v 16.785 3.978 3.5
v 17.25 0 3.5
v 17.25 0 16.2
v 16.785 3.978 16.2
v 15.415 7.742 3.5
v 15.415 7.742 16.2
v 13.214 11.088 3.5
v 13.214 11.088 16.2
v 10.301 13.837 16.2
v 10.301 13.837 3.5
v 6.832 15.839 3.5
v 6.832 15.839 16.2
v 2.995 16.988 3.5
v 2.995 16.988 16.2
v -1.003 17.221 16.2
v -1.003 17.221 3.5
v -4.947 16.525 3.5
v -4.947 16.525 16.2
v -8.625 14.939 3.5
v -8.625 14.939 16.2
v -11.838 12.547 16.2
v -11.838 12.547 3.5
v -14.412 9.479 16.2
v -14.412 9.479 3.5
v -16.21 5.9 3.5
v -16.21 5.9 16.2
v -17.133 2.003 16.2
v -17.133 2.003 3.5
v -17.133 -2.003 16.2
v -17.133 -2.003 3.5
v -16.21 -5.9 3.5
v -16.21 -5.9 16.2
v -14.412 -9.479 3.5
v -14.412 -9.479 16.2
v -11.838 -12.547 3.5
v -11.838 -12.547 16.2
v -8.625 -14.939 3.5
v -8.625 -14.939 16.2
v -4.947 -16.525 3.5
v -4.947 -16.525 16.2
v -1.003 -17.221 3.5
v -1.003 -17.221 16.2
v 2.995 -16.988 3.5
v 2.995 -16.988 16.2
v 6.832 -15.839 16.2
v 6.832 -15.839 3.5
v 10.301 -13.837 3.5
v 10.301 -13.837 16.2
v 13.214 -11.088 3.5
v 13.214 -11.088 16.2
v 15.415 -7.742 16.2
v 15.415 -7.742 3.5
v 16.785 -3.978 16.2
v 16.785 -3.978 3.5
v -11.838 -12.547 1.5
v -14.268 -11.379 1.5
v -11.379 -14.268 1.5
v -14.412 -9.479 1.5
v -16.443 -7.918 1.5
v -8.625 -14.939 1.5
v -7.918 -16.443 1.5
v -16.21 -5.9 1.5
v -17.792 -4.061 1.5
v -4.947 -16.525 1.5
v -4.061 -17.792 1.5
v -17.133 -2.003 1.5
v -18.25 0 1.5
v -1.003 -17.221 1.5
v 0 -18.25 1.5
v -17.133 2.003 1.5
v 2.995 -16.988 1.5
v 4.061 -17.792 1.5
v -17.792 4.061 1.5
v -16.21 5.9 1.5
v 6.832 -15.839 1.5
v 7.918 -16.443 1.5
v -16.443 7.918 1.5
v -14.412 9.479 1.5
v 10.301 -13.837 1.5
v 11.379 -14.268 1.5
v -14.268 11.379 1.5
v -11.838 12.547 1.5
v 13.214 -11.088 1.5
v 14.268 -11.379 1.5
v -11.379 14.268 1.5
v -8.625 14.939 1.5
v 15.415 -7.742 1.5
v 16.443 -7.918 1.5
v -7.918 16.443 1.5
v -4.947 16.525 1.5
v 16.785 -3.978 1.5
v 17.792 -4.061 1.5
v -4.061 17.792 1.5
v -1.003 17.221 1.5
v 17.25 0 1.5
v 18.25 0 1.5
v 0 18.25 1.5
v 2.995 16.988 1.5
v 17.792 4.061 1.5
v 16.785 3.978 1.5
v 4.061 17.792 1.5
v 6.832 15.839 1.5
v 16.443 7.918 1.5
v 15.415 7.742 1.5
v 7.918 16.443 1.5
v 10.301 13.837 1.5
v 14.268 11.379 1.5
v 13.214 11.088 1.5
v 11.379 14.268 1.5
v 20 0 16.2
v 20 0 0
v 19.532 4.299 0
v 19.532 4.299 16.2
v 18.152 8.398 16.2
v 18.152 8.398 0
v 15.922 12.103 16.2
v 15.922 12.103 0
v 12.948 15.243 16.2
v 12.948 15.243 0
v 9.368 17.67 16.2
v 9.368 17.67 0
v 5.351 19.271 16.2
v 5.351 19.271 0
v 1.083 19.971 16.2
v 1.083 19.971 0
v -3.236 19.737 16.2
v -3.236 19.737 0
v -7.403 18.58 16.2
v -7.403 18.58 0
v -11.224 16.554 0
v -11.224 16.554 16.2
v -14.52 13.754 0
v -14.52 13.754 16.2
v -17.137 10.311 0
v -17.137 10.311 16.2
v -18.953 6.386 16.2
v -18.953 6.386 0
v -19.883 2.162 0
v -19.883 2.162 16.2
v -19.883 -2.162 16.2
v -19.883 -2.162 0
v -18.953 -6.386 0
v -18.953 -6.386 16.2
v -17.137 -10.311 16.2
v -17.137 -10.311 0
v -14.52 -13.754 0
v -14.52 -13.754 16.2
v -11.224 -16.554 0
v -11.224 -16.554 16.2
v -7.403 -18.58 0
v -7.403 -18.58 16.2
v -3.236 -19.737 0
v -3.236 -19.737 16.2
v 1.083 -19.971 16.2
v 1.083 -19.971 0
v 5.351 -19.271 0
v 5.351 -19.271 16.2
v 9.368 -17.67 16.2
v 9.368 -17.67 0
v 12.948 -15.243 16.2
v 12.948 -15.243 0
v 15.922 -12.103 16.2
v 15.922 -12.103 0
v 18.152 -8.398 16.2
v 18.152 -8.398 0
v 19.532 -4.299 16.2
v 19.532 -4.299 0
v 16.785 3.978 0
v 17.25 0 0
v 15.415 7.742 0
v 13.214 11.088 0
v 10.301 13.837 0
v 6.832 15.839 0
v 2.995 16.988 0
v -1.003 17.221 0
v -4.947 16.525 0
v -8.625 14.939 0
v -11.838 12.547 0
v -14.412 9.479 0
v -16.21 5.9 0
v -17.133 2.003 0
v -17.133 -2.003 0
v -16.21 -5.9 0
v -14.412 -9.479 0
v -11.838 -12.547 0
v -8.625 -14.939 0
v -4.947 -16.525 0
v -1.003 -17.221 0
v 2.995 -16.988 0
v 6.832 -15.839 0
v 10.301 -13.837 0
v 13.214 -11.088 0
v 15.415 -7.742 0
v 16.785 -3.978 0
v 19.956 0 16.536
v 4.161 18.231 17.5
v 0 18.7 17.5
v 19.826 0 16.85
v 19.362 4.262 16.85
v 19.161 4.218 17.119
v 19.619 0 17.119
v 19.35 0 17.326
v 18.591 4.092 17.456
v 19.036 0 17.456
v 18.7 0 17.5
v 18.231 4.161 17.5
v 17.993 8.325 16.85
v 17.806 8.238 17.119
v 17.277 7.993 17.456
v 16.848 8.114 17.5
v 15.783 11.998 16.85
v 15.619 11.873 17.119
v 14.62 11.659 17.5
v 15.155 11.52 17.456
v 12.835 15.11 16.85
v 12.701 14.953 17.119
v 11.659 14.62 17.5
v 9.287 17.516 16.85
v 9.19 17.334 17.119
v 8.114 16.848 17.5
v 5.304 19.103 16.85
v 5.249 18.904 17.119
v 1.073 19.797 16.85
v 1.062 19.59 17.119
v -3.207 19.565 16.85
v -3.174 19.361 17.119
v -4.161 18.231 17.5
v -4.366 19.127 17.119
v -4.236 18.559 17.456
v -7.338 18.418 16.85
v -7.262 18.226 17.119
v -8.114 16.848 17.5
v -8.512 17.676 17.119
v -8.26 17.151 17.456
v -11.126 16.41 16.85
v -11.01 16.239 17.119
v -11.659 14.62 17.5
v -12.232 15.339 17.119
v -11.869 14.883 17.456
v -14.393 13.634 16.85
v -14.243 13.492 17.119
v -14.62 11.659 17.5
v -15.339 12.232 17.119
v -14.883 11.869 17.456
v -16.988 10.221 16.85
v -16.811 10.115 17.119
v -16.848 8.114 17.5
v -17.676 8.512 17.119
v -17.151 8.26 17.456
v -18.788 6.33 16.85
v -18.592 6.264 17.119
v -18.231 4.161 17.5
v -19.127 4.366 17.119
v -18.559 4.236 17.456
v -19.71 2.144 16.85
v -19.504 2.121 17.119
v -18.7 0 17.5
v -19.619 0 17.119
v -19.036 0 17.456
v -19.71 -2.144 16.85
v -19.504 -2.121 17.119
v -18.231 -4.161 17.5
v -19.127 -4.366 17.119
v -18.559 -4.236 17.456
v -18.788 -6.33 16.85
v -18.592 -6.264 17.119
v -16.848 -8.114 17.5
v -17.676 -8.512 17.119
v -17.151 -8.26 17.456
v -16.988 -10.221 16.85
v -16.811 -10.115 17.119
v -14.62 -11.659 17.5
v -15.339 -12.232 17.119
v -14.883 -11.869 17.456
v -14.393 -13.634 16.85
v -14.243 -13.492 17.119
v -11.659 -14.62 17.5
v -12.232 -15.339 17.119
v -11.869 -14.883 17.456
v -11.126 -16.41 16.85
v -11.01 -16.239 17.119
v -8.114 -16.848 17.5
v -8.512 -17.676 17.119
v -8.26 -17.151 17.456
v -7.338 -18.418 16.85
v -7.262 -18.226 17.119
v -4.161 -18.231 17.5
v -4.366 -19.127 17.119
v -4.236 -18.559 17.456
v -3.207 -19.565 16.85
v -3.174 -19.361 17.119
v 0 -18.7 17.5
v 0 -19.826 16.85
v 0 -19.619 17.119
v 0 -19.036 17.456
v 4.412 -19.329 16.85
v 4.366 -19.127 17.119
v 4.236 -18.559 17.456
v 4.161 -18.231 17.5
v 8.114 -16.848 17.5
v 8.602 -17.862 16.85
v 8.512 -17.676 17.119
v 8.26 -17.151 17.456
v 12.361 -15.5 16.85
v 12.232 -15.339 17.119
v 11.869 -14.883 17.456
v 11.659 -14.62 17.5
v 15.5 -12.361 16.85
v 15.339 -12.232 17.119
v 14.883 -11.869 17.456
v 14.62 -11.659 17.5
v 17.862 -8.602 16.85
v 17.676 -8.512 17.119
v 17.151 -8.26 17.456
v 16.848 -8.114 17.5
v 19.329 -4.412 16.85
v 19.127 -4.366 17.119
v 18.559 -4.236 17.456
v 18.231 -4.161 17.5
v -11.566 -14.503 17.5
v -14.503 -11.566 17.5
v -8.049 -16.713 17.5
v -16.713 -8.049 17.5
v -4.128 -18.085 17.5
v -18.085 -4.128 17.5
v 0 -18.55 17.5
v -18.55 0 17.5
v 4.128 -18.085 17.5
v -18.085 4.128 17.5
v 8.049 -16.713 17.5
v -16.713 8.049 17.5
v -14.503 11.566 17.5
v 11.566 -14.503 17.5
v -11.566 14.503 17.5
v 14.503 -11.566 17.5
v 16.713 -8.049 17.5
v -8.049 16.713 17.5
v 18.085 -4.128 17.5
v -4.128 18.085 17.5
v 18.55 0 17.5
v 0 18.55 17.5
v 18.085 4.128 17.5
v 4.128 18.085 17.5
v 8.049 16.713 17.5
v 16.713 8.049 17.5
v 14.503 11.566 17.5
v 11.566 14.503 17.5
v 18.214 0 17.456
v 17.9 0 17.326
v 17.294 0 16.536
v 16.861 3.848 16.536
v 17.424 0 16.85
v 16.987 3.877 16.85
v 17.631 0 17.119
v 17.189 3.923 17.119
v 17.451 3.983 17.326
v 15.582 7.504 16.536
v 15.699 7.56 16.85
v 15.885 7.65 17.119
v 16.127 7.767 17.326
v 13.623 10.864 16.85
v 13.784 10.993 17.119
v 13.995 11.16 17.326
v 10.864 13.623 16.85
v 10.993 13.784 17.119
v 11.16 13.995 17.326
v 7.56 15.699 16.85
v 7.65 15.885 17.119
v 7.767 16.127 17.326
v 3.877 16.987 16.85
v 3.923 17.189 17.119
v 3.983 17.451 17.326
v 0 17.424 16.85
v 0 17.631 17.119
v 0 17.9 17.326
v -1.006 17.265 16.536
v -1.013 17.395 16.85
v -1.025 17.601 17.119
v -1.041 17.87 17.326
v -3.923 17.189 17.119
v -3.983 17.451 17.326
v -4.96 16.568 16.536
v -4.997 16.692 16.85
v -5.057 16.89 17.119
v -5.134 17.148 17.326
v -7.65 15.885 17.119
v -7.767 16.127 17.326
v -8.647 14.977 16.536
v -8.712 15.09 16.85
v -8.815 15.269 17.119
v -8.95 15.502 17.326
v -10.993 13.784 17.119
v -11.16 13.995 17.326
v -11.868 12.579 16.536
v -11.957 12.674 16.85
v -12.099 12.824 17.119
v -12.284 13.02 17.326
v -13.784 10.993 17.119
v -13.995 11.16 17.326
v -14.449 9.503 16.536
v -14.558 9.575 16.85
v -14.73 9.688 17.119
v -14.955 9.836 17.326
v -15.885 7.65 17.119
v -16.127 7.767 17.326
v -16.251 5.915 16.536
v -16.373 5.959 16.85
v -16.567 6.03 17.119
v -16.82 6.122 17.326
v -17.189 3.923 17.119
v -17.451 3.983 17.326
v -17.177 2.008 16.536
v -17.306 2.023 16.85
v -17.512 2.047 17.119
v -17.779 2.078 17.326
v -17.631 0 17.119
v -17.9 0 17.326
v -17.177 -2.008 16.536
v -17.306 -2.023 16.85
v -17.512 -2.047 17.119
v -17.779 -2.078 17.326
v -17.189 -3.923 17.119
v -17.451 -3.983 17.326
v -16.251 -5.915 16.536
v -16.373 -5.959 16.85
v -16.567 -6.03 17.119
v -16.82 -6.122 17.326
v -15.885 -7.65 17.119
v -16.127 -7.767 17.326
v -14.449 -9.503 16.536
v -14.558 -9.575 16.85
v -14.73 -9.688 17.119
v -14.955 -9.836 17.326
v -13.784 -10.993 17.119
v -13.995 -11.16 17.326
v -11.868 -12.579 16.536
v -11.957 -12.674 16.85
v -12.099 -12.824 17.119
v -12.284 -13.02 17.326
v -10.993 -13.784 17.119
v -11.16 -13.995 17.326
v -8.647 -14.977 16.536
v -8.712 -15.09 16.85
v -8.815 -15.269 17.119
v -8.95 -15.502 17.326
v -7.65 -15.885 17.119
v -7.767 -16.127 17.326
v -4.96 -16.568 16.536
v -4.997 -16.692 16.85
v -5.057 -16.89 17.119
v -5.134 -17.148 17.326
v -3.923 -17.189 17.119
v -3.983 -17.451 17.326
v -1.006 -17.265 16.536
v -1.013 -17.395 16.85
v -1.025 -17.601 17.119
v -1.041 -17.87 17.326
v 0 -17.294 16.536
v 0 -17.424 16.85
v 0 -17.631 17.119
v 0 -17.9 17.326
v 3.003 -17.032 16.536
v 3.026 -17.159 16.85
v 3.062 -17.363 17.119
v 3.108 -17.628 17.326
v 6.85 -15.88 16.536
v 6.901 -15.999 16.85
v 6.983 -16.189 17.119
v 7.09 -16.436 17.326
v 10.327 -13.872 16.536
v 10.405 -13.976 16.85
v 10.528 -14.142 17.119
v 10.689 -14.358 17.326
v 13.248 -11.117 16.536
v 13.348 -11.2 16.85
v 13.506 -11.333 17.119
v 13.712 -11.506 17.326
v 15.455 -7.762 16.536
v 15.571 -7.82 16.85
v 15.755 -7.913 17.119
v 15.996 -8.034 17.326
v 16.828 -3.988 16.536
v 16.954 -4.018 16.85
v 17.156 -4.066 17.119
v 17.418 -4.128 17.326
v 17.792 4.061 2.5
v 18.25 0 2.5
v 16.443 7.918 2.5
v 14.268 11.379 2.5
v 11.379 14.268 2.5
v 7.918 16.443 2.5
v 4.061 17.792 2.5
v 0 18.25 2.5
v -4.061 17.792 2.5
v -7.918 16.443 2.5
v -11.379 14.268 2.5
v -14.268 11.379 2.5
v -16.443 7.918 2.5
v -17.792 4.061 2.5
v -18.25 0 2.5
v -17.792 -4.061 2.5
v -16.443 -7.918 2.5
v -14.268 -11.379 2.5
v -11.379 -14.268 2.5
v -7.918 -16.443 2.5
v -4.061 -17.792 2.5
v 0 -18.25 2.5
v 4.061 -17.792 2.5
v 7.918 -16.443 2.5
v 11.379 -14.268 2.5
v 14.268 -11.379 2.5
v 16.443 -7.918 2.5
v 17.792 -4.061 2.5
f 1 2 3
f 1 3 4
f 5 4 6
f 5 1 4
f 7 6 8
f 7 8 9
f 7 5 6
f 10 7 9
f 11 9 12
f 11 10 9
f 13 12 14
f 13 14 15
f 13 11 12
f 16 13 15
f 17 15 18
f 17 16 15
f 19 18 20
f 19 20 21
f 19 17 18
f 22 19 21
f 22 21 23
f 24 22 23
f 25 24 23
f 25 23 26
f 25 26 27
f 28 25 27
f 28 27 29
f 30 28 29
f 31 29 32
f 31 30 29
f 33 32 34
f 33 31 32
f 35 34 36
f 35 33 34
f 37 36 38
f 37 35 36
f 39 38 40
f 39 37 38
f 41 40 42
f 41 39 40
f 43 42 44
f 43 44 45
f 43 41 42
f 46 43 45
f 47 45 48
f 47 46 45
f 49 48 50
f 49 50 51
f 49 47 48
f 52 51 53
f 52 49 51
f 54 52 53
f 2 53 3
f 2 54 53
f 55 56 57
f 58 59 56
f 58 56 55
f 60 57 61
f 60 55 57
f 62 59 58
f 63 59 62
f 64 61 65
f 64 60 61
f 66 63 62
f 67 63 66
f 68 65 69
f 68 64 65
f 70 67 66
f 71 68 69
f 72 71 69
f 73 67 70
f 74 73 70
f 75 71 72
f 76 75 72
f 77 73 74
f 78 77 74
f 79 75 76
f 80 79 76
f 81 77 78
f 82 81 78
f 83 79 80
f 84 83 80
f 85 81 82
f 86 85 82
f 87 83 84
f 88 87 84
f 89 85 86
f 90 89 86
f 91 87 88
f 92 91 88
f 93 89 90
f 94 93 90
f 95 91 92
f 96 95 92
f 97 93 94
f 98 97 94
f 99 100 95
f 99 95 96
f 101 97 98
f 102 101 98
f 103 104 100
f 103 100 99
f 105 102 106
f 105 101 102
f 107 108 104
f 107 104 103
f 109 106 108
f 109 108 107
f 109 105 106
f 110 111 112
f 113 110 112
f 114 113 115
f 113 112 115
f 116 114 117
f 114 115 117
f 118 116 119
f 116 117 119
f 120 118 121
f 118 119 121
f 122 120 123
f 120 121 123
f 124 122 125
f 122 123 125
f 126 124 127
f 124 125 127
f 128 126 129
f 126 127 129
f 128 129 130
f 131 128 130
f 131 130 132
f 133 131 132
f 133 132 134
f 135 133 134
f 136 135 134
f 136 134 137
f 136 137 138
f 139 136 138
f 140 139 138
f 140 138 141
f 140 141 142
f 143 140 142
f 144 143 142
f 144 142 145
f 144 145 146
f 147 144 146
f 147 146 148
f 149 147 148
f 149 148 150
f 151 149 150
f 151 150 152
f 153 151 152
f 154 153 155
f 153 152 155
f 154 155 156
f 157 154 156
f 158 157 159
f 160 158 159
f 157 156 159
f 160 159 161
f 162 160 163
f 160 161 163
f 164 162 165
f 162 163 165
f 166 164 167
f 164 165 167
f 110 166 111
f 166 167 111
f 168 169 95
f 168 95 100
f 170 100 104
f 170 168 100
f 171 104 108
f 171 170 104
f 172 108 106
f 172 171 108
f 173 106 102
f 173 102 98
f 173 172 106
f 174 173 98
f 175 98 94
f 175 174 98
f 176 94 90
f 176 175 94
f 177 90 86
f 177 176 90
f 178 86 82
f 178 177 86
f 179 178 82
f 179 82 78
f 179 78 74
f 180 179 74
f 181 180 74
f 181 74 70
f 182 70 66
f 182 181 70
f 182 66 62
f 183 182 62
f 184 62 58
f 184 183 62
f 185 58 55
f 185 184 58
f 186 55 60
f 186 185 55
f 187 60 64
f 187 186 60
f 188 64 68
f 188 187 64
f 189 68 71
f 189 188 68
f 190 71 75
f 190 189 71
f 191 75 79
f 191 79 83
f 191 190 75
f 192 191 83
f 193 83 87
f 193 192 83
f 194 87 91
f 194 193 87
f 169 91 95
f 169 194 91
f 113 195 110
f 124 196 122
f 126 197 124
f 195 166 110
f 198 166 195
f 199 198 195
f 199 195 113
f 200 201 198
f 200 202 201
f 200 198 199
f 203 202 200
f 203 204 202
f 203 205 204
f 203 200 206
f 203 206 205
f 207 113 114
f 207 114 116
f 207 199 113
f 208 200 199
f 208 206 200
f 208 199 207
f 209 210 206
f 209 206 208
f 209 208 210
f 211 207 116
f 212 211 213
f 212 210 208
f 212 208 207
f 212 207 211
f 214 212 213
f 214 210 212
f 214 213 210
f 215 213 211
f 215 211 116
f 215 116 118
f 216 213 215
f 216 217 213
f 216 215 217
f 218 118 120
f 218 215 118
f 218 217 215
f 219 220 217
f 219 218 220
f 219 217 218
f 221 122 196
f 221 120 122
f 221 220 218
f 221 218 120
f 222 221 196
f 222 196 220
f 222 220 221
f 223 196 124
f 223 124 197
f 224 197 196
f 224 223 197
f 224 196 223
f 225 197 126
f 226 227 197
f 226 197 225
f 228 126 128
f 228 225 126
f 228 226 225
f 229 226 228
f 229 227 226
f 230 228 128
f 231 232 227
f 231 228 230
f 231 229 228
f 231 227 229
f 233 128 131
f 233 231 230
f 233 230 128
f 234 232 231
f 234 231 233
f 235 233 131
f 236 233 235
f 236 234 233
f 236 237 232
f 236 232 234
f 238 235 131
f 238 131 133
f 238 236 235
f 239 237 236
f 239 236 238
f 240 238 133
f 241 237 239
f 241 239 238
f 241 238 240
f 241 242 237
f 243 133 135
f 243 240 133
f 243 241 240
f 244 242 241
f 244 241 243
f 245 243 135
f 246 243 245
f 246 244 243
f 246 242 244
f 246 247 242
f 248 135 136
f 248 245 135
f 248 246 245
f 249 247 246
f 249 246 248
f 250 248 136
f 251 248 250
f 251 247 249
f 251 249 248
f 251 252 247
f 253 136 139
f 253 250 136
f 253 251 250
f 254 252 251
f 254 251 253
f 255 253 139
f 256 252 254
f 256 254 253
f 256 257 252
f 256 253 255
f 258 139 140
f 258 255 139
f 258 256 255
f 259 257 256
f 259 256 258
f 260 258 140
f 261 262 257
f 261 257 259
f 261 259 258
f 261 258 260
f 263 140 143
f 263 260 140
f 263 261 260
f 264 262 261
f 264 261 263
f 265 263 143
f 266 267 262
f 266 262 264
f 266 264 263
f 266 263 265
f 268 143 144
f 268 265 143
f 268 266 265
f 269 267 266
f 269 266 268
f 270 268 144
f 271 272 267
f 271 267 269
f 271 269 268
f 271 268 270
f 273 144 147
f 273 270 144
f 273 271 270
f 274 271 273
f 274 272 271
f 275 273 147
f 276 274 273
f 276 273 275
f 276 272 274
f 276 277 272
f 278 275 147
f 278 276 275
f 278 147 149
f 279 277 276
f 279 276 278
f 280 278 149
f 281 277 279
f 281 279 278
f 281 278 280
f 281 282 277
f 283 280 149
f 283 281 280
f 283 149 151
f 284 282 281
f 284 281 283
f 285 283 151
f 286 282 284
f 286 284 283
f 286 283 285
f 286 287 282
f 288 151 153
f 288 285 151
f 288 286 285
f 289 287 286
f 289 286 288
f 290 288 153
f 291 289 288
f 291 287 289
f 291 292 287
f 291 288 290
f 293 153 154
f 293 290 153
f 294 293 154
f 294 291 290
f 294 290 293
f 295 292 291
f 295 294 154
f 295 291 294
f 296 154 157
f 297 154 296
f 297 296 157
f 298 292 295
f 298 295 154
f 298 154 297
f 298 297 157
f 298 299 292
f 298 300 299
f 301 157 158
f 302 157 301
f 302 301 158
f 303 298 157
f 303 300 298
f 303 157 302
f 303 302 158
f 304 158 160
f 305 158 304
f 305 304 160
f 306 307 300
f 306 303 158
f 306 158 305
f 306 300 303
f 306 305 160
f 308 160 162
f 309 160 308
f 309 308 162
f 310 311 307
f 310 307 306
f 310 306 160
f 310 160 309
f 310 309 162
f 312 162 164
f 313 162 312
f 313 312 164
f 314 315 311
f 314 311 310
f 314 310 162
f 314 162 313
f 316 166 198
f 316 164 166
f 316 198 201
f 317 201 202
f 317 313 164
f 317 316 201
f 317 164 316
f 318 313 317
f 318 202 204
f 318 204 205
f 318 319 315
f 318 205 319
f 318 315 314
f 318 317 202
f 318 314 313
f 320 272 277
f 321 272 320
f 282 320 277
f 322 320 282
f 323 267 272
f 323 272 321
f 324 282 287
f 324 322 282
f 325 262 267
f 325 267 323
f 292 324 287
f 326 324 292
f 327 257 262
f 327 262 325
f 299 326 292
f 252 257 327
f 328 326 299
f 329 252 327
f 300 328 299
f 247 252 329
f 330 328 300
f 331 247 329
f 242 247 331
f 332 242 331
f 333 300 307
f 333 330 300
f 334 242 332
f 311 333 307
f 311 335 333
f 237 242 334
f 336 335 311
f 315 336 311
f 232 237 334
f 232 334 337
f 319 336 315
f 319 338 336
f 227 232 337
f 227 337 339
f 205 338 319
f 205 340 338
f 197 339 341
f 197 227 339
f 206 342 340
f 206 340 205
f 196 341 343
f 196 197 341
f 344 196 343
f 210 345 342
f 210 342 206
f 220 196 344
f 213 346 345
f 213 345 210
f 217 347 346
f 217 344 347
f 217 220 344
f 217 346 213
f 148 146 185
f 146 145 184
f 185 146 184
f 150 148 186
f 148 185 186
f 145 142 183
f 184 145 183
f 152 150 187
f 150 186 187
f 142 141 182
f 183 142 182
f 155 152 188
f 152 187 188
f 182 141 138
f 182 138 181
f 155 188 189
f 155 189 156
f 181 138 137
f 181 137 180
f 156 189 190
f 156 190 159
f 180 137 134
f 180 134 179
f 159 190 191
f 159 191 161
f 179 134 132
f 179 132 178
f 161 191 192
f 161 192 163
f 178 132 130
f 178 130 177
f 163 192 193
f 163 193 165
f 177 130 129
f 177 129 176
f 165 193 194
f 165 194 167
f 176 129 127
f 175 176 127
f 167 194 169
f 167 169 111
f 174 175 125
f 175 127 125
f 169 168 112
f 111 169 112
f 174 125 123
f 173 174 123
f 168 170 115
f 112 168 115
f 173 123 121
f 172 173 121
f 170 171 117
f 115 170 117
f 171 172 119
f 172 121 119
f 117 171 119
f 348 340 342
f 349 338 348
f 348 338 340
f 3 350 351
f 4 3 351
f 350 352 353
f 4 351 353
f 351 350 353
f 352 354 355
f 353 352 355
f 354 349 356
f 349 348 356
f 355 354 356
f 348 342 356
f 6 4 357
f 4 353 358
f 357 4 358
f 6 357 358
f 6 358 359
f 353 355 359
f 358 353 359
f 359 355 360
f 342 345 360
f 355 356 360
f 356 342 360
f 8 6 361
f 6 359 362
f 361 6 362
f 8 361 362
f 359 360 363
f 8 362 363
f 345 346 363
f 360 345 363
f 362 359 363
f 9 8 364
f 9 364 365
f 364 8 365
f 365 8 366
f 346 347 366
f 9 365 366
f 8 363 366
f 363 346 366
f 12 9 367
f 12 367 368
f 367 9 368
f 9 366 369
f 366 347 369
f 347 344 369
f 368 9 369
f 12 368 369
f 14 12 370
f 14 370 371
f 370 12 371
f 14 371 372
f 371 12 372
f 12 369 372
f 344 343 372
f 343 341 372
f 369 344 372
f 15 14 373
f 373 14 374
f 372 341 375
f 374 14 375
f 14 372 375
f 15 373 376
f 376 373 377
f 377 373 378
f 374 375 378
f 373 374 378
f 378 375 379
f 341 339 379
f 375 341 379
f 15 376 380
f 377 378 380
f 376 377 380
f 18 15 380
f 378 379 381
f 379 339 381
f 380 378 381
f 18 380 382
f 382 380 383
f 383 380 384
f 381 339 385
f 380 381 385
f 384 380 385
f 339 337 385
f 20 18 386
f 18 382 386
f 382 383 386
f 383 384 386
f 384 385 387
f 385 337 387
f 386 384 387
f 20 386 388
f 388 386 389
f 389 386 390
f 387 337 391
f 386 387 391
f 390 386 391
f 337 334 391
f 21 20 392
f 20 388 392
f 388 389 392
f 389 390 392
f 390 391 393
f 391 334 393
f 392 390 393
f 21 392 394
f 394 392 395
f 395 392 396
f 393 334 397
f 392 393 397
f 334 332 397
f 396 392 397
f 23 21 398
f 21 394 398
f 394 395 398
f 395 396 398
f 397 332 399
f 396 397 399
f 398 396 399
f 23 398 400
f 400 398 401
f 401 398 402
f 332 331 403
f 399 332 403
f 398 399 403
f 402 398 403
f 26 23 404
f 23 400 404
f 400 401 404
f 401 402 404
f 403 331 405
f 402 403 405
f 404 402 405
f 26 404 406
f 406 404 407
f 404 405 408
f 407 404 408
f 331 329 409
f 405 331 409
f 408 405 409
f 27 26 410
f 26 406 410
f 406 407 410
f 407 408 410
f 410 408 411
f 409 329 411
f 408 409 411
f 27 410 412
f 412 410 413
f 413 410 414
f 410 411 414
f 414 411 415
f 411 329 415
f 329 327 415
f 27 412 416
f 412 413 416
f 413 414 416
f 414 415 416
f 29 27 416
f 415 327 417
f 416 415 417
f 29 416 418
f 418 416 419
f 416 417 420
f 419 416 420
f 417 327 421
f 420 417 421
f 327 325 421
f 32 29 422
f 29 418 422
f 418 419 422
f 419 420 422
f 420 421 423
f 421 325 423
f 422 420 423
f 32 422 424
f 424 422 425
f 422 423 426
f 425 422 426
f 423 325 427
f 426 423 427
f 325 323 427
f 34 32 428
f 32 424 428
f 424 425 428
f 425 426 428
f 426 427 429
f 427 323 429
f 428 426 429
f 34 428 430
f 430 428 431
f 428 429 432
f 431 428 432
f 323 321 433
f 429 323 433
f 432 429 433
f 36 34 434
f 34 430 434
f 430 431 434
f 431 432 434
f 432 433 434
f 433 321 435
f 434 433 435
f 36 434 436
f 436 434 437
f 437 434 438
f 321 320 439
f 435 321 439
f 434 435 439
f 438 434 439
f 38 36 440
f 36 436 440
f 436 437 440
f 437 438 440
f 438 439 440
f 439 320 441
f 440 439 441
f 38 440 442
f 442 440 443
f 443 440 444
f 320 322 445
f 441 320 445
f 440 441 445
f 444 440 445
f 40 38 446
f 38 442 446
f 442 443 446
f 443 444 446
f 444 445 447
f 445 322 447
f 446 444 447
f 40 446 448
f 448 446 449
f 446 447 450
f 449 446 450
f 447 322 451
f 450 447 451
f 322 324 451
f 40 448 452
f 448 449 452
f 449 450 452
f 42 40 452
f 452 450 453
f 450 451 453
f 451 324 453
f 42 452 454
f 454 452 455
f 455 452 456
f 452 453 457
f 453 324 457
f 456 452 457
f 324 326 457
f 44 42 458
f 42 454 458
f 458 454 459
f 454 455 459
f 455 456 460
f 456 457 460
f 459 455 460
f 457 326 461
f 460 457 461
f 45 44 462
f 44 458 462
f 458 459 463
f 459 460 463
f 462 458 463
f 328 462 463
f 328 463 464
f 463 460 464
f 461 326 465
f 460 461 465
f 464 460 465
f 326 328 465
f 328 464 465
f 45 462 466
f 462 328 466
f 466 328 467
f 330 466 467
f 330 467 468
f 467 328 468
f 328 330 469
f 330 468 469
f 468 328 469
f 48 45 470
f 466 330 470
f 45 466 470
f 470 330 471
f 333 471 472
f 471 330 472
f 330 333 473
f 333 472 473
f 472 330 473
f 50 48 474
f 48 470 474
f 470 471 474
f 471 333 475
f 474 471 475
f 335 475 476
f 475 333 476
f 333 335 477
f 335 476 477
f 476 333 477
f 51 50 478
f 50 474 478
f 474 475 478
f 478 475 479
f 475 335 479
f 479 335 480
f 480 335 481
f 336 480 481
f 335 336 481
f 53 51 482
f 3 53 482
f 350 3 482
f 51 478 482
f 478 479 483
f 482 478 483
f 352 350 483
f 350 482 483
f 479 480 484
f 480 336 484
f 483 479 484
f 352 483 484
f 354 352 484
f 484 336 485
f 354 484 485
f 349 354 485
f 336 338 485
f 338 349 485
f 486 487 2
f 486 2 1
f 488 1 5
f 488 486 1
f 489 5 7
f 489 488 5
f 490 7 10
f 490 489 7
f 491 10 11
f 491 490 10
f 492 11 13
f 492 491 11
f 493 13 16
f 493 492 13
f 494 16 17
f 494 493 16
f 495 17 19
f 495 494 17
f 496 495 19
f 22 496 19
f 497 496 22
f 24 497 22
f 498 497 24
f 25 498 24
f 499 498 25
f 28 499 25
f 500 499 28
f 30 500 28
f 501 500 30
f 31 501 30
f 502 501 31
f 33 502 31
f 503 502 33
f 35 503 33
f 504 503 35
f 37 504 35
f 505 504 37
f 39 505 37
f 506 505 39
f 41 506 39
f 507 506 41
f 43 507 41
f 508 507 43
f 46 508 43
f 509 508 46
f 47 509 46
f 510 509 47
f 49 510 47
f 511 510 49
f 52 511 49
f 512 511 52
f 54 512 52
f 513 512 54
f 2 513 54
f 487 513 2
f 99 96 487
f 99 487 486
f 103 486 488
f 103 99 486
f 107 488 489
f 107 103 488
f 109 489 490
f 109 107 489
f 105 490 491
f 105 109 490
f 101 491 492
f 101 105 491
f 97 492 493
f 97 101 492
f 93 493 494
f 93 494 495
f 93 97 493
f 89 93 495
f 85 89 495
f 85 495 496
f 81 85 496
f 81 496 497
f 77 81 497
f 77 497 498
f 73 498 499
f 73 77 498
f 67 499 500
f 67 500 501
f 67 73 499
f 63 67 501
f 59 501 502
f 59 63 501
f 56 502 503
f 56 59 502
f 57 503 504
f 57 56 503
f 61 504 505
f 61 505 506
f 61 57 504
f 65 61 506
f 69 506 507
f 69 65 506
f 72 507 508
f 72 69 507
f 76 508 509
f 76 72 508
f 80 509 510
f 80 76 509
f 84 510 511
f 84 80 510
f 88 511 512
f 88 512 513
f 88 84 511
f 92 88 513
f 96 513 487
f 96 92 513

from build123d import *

# Parameters (mm, degrees)
F0_R     = 20
F0_R_2   = 17.25
F1_DEPTH = 1.5
F2_R     = 20
F2_R_2   = 18.25
F3_DEPTH = 1
F4_R     = 20
F4_R_2   = 17.25
F5_DEPTH = 15
F6_R     = 1.3
F7_SIZE  = 0.99999


# Not quite as in the source:
# - a fillet or chamfer is up to 0.001 mm smaller than in the source, because OpenCascade refuses the exact size


with BuildPart() as f1:
    # F0 (on Top) → F1 (new body)
    with BuildSketch(Plane.XY):
        Circle(F0_R)
        Circle(F0_R_2, mode=Mode.SUBTRACT)
    extrude(amount=F1_DEPTH)

    # F2 (on face) → F3 (join)
    with BuildSketch(Plane.XY.offset(1.5)):
        Circle(F2_R)
        Circle(F2_R_2, mode=Mode.SUBTRACT)
    extrude(amount=F3_DEPTH)

    # F4 (on face) → F5 (join)
    with BuildSketch(Plane.XY.offset(2.5)):
        Circle(F4_R)
        Circle(F4_R_2, mode=Mode.SUBTRACT)
    extrude(amount=F5_DEPTH)

    # F6
    f6_edges = [f1.edges().sort_by_distance(p)[0] for p in [
        (-17.25, 0, 17.5),
        (-20, 0, 17.5),
    ]]
    fillet(f6_edges, radius=F6_R)

    # F7 (size 1 in the source; OpenCascade refuses exactly that, so slightly less here)
    f7_edges = [f1.edges().sort_by_distance(p)[0] for p in [
        (-17.25, 0, 2.5),
    ]]
    chamfer(f7_edges, length=F7_SIZE)


solid = f1.part
